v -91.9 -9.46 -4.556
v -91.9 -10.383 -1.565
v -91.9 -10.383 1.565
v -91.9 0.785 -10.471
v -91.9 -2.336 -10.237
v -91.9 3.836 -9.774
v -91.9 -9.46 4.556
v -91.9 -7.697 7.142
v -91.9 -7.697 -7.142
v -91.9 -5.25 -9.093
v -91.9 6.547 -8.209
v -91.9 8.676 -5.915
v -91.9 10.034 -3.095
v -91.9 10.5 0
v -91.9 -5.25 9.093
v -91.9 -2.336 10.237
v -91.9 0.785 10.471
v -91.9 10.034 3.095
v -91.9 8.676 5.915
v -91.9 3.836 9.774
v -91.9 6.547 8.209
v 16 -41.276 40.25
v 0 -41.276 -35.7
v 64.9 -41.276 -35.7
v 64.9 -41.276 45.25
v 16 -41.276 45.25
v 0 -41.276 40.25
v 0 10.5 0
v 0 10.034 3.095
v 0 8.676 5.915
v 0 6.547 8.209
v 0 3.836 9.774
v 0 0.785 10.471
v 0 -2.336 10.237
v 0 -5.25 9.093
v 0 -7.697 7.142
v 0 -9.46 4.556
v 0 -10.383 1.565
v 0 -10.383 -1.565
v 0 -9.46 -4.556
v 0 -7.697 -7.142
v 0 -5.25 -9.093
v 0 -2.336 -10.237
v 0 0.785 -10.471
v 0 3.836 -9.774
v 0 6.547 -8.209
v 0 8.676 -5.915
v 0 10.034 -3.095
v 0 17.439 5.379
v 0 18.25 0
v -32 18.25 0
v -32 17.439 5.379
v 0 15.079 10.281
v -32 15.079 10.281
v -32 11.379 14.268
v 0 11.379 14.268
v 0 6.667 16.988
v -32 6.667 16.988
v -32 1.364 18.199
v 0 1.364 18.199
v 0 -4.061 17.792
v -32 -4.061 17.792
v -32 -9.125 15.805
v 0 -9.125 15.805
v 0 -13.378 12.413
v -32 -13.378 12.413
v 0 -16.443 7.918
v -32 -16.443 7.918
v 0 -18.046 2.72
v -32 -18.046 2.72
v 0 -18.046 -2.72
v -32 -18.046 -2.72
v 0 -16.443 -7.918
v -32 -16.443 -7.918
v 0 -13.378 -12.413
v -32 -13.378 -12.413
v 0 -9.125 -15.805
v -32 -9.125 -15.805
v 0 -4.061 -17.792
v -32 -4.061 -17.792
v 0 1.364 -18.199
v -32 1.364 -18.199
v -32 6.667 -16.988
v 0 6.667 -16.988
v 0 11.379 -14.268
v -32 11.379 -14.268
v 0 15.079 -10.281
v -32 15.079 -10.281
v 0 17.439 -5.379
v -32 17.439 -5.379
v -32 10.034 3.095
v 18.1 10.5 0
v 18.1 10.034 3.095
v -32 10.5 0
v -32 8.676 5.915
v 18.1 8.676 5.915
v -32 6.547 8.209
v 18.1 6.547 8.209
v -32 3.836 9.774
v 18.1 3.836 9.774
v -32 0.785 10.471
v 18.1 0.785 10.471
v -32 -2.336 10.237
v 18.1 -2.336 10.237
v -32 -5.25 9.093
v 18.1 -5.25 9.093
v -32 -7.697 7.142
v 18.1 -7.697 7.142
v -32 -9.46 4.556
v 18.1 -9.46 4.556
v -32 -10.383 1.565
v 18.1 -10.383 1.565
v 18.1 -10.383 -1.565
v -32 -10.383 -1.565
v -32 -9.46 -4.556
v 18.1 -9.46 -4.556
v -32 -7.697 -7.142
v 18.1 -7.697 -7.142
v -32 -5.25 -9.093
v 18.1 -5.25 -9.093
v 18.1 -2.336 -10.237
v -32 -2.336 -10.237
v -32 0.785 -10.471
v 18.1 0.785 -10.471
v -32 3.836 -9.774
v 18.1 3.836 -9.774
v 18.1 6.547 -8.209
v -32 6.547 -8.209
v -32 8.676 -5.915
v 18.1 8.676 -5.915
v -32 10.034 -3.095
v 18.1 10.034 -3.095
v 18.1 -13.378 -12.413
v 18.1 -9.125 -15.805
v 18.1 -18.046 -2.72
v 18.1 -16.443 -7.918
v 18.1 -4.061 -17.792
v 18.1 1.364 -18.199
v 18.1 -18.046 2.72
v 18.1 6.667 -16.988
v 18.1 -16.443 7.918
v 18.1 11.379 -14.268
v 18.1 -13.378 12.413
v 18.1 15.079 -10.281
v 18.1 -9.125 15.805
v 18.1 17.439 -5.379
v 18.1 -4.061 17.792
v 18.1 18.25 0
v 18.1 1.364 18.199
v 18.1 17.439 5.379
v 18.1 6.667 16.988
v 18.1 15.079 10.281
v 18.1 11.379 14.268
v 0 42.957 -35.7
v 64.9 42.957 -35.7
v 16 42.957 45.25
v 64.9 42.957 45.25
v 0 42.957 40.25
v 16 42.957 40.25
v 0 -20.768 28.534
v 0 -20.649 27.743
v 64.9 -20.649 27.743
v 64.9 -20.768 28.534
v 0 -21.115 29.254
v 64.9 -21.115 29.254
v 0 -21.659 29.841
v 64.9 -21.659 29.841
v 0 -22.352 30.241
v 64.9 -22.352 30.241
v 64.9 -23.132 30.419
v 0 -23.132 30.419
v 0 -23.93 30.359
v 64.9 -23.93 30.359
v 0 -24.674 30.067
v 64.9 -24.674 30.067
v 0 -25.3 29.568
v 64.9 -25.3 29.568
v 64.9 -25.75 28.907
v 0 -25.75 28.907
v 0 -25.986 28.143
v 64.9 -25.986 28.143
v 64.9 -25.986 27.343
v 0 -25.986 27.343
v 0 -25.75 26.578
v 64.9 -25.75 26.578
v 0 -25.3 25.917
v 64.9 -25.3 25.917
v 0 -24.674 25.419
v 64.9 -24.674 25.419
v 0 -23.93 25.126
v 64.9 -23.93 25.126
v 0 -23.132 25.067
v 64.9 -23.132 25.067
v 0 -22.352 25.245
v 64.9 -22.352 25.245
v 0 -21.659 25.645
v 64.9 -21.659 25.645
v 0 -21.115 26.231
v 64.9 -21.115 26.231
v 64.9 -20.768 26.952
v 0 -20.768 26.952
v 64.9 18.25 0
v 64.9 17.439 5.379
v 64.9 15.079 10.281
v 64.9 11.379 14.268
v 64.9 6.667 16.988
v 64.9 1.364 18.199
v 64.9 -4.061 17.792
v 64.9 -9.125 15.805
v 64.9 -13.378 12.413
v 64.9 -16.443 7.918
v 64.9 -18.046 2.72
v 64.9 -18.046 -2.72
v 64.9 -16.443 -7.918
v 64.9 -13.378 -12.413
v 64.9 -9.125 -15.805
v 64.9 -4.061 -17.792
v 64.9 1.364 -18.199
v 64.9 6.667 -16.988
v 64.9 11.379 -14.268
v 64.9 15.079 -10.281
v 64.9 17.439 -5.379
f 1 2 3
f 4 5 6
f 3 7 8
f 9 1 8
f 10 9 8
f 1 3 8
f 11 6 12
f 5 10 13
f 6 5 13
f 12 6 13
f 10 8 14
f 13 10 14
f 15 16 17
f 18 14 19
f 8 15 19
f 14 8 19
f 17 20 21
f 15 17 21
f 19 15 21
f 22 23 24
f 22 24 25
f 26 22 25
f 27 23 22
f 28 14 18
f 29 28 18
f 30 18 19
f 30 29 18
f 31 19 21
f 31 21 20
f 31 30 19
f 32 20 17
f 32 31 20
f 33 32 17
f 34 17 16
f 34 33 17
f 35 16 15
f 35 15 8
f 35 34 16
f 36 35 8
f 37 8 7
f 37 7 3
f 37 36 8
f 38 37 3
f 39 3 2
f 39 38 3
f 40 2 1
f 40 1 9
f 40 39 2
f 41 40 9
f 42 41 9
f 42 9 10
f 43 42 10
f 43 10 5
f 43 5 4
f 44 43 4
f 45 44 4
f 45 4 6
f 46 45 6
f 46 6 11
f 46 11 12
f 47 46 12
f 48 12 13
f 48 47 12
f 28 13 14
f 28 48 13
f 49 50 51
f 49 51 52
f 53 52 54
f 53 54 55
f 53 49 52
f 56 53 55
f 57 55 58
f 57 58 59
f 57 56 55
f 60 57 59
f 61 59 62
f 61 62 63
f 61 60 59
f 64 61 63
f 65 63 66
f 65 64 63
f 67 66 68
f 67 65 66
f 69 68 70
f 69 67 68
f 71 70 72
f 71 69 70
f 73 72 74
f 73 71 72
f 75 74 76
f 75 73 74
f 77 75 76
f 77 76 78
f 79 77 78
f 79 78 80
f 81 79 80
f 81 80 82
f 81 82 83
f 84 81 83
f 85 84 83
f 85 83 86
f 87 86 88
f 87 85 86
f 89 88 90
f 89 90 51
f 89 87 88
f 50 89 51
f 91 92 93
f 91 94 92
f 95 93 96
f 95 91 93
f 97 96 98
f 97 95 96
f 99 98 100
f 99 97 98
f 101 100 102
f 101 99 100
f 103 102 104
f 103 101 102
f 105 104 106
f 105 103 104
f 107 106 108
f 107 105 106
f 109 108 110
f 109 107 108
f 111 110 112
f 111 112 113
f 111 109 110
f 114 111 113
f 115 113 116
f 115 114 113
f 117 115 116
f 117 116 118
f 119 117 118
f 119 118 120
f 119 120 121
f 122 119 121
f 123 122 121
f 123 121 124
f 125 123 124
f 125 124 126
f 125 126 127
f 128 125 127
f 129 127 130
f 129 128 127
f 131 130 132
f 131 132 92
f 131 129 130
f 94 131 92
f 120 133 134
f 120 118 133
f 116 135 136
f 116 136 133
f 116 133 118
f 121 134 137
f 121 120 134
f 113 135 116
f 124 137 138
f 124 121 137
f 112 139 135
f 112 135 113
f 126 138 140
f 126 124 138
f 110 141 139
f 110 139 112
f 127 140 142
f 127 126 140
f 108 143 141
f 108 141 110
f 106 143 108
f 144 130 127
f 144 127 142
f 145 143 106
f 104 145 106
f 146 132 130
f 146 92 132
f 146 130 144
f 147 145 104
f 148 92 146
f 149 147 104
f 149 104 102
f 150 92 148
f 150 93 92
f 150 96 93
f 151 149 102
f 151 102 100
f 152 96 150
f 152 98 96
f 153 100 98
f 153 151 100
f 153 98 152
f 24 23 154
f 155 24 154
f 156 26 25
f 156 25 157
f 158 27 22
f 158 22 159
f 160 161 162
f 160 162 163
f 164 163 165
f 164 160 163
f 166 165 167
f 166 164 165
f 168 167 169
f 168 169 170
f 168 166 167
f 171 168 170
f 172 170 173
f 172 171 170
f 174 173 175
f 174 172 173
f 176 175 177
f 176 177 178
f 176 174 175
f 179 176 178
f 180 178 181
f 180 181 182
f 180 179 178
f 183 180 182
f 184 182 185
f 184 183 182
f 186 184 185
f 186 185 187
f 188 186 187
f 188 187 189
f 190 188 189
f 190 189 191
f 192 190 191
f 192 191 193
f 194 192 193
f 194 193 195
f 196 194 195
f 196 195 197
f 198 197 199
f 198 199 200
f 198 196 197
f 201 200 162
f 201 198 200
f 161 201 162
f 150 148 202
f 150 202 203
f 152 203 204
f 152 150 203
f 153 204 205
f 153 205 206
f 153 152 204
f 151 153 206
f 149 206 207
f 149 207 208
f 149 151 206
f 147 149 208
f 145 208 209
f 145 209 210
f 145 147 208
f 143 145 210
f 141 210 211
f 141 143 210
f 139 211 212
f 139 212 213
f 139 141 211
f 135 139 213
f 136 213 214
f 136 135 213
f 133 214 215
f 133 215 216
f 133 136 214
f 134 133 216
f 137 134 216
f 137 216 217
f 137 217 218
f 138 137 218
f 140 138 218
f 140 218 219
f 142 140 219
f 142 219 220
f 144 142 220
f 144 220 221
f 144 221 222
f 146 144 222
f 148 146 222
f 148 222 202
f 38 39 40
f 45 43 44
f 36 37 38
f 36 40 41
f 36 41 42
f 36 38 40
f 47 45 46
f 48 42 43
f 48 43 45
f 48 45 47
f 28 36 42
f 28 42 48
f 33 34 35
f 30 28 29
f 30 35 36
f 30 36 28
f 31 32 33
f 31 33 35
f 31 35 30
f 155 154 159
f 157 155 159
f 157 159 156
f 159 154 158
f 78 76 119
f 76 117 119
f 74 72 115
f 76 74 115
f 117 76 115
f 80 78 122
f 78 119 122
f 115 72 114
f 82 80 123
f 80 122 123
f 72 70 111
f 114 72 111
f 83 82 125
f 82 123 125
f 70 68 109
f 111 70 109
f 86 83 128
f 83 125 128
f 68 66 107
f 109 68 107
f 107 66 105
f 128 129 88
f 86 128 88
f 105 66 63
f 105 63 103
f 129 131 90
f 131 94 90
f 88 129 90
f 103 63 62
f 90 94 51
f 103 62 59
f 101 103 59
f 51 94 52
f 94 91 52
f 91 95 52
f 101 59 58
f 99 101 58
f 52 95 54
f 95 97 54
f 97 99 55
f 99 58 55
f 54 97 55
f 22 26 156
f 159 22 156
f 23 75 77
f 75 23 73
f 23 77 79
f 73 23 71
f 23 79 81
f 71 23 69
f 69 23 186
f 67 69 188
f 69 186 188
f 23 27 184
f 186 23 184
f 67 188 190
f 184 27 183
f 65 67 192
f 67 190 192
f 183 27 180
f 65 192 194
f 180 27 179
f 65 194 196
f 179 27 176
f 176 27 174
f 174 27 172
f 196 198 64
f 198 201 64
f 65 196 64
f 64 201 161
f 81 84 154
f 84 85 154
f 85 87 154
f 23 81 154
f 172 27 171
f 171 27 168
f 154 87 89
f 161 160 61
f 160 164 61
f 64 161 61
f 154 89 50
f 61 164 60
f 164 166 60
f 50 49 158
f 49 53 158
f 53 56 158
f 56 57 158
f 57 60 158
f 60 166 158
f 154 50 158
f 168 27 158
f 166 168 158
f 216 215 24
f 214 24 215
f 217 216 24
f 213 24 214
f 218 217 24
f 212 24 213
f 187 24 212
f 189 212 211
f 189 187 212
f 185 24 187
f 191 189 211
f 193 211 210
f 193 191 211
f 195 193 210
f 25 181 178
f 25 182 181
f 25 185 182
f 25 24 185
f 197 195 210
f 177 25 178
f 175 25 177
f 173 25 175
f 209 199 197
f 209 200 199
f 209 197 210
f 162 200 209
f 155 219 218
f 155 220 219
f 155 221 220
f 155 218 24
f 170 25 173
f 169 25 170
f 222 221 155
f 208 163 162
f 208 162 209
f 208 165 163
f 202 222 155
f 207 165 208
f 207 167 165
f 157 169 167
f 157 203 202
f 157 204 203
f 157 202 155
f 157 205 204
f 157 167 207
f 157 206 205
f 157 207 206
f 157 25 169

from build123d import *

# Parameters (mm, degrees)
F0_W          = 84.2324148785
F0_H          = 75.9502873162
F0_R          = 18.25
F0_R_2        = 2.6835567487
F1_DEPTH      = 64.9
F2_START      = 16
F0_H_2        = 5
F2_DEPTH      = 48.9
F0_R_3        = 10.5
F3_DEPTH      = 32
F3_DEPTH_BACK = 18.1
F4_DEPTH      = 91.9


with BuildPart() as f1:
    # F0 (on Right) → F1 (new body)
    with BuildSketch(Plane.YZ):
        with Locations((0.8405496071, 2.2748563419)):
            Rectangle(F0_W, F0_H)
        Circle(F0_R, mode=Mode.SUBTRACT)
        with Locations((-23.3325695414, 27.7426332311)):
            Circle(F0_R_2, mode=Mode.SUBTRACT)
    extrude(amount=F1_DEPTH)

    # F0 (on Right) → F2 (join)
    with BuildSketch(Plane.YZ.offset(F2_START)):
        with Locations((0.8405496071, 42.75)):
            Rectangle(F0_W, F0_H_2)
    extrude(amount=F2_DEPTH)

    # F0 (on Right) → F3 (join, two sides)
    with BuildSketch(Plane.YZ) as f3_sk:
        Circle(F0_R)
        Circle(F0_R_3, mode=Mode.SUBTRACT)
    extrude(amount=-F3_DEPTH)
    extrude(f3_sk.sketch, amount=F3_DEPTH_BACK)


with BuildPart() as f4:
    # F0 (on Right) → F4 (new body)
    with BuildSketch(Plane.YZ):
        Circle(F0_R_3)
    extrude(amount=-F4_DEPTH)


solid = Compound([f1.part, f4.part])
